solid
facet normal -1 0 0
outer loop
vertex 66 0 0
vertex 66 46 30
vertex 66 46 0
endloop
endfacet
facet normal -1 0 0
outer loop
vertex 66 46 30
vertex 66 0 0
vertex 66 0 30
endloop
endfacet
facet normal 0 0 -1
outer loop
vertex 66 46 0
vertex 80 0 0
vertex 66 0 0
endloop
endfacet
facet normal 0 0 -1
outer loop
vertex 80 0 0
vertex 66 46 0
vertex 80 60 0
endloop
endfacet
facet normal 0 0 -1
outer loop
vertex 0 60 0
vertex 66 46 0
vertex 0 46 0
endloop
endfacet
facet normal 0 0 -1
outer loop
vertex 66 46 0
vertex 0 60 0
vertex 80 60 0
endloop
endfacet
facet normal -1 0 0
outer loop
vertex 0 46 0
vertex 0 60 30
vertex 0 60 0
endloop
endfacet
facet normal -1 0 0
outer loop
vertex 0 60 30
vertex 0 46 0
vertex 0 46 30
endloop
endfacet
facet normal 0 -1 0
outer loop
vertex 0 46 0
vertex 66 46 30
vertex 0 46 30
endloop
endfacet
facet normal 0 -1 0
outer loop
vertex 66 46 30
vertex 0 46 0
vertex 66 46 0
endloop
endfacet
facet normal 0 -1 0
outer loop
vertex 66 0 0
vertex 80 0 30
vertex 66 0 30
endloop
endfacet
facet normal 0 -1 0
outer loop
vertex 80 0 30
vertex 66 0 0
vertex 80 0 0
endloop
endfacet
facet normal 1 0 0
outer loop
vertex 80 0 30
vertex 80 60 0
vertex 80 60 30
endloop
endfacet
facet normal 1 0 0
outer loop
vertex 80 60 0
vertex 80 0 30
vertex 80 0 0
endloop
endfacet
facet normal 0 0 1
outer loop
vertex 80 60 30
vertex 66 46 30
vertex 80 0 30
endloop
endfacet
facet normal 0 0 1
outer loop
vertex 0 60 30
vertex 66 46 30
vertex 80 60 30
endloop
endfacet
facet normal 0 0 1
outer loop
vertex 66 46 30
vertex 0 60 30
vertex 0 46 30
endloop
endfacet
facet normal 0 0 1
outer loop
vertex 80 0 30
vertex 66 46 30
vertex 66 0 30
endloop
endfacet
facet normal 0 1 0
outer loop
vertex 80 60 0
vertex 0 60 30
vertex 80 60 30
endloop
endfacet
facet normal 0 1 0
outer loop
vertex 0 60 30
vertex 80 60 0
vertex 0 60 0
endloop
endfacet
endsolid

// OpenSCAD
// Two-part box enclosure for a small electronics board, printed as one piece with a part
// between them. NOVEL general part.
//

box_x   = 70;
box_y   = 50;
box_z   = 30;
wall    = 2;
floor   = 2;

lip_t   = 1.5;
lip_h   = 4;
clearance = 0.2;

$fn = 48;

part_size_x = box_x + 10;
part_size_y = box_y + 10;
part_size_z = max(box_z, floor + lip_h + lip_t);      // tall enough for the box and the lip

difference() {
    cube([part_size_x, part_size_y, part_size_z]);
    for (p = [box_x + 5, box_y + 5])
        translate(p) cube([box_x - 2 * wall, box_y - 2 * wall, box_z + 1]);   // hollow the box side
}
